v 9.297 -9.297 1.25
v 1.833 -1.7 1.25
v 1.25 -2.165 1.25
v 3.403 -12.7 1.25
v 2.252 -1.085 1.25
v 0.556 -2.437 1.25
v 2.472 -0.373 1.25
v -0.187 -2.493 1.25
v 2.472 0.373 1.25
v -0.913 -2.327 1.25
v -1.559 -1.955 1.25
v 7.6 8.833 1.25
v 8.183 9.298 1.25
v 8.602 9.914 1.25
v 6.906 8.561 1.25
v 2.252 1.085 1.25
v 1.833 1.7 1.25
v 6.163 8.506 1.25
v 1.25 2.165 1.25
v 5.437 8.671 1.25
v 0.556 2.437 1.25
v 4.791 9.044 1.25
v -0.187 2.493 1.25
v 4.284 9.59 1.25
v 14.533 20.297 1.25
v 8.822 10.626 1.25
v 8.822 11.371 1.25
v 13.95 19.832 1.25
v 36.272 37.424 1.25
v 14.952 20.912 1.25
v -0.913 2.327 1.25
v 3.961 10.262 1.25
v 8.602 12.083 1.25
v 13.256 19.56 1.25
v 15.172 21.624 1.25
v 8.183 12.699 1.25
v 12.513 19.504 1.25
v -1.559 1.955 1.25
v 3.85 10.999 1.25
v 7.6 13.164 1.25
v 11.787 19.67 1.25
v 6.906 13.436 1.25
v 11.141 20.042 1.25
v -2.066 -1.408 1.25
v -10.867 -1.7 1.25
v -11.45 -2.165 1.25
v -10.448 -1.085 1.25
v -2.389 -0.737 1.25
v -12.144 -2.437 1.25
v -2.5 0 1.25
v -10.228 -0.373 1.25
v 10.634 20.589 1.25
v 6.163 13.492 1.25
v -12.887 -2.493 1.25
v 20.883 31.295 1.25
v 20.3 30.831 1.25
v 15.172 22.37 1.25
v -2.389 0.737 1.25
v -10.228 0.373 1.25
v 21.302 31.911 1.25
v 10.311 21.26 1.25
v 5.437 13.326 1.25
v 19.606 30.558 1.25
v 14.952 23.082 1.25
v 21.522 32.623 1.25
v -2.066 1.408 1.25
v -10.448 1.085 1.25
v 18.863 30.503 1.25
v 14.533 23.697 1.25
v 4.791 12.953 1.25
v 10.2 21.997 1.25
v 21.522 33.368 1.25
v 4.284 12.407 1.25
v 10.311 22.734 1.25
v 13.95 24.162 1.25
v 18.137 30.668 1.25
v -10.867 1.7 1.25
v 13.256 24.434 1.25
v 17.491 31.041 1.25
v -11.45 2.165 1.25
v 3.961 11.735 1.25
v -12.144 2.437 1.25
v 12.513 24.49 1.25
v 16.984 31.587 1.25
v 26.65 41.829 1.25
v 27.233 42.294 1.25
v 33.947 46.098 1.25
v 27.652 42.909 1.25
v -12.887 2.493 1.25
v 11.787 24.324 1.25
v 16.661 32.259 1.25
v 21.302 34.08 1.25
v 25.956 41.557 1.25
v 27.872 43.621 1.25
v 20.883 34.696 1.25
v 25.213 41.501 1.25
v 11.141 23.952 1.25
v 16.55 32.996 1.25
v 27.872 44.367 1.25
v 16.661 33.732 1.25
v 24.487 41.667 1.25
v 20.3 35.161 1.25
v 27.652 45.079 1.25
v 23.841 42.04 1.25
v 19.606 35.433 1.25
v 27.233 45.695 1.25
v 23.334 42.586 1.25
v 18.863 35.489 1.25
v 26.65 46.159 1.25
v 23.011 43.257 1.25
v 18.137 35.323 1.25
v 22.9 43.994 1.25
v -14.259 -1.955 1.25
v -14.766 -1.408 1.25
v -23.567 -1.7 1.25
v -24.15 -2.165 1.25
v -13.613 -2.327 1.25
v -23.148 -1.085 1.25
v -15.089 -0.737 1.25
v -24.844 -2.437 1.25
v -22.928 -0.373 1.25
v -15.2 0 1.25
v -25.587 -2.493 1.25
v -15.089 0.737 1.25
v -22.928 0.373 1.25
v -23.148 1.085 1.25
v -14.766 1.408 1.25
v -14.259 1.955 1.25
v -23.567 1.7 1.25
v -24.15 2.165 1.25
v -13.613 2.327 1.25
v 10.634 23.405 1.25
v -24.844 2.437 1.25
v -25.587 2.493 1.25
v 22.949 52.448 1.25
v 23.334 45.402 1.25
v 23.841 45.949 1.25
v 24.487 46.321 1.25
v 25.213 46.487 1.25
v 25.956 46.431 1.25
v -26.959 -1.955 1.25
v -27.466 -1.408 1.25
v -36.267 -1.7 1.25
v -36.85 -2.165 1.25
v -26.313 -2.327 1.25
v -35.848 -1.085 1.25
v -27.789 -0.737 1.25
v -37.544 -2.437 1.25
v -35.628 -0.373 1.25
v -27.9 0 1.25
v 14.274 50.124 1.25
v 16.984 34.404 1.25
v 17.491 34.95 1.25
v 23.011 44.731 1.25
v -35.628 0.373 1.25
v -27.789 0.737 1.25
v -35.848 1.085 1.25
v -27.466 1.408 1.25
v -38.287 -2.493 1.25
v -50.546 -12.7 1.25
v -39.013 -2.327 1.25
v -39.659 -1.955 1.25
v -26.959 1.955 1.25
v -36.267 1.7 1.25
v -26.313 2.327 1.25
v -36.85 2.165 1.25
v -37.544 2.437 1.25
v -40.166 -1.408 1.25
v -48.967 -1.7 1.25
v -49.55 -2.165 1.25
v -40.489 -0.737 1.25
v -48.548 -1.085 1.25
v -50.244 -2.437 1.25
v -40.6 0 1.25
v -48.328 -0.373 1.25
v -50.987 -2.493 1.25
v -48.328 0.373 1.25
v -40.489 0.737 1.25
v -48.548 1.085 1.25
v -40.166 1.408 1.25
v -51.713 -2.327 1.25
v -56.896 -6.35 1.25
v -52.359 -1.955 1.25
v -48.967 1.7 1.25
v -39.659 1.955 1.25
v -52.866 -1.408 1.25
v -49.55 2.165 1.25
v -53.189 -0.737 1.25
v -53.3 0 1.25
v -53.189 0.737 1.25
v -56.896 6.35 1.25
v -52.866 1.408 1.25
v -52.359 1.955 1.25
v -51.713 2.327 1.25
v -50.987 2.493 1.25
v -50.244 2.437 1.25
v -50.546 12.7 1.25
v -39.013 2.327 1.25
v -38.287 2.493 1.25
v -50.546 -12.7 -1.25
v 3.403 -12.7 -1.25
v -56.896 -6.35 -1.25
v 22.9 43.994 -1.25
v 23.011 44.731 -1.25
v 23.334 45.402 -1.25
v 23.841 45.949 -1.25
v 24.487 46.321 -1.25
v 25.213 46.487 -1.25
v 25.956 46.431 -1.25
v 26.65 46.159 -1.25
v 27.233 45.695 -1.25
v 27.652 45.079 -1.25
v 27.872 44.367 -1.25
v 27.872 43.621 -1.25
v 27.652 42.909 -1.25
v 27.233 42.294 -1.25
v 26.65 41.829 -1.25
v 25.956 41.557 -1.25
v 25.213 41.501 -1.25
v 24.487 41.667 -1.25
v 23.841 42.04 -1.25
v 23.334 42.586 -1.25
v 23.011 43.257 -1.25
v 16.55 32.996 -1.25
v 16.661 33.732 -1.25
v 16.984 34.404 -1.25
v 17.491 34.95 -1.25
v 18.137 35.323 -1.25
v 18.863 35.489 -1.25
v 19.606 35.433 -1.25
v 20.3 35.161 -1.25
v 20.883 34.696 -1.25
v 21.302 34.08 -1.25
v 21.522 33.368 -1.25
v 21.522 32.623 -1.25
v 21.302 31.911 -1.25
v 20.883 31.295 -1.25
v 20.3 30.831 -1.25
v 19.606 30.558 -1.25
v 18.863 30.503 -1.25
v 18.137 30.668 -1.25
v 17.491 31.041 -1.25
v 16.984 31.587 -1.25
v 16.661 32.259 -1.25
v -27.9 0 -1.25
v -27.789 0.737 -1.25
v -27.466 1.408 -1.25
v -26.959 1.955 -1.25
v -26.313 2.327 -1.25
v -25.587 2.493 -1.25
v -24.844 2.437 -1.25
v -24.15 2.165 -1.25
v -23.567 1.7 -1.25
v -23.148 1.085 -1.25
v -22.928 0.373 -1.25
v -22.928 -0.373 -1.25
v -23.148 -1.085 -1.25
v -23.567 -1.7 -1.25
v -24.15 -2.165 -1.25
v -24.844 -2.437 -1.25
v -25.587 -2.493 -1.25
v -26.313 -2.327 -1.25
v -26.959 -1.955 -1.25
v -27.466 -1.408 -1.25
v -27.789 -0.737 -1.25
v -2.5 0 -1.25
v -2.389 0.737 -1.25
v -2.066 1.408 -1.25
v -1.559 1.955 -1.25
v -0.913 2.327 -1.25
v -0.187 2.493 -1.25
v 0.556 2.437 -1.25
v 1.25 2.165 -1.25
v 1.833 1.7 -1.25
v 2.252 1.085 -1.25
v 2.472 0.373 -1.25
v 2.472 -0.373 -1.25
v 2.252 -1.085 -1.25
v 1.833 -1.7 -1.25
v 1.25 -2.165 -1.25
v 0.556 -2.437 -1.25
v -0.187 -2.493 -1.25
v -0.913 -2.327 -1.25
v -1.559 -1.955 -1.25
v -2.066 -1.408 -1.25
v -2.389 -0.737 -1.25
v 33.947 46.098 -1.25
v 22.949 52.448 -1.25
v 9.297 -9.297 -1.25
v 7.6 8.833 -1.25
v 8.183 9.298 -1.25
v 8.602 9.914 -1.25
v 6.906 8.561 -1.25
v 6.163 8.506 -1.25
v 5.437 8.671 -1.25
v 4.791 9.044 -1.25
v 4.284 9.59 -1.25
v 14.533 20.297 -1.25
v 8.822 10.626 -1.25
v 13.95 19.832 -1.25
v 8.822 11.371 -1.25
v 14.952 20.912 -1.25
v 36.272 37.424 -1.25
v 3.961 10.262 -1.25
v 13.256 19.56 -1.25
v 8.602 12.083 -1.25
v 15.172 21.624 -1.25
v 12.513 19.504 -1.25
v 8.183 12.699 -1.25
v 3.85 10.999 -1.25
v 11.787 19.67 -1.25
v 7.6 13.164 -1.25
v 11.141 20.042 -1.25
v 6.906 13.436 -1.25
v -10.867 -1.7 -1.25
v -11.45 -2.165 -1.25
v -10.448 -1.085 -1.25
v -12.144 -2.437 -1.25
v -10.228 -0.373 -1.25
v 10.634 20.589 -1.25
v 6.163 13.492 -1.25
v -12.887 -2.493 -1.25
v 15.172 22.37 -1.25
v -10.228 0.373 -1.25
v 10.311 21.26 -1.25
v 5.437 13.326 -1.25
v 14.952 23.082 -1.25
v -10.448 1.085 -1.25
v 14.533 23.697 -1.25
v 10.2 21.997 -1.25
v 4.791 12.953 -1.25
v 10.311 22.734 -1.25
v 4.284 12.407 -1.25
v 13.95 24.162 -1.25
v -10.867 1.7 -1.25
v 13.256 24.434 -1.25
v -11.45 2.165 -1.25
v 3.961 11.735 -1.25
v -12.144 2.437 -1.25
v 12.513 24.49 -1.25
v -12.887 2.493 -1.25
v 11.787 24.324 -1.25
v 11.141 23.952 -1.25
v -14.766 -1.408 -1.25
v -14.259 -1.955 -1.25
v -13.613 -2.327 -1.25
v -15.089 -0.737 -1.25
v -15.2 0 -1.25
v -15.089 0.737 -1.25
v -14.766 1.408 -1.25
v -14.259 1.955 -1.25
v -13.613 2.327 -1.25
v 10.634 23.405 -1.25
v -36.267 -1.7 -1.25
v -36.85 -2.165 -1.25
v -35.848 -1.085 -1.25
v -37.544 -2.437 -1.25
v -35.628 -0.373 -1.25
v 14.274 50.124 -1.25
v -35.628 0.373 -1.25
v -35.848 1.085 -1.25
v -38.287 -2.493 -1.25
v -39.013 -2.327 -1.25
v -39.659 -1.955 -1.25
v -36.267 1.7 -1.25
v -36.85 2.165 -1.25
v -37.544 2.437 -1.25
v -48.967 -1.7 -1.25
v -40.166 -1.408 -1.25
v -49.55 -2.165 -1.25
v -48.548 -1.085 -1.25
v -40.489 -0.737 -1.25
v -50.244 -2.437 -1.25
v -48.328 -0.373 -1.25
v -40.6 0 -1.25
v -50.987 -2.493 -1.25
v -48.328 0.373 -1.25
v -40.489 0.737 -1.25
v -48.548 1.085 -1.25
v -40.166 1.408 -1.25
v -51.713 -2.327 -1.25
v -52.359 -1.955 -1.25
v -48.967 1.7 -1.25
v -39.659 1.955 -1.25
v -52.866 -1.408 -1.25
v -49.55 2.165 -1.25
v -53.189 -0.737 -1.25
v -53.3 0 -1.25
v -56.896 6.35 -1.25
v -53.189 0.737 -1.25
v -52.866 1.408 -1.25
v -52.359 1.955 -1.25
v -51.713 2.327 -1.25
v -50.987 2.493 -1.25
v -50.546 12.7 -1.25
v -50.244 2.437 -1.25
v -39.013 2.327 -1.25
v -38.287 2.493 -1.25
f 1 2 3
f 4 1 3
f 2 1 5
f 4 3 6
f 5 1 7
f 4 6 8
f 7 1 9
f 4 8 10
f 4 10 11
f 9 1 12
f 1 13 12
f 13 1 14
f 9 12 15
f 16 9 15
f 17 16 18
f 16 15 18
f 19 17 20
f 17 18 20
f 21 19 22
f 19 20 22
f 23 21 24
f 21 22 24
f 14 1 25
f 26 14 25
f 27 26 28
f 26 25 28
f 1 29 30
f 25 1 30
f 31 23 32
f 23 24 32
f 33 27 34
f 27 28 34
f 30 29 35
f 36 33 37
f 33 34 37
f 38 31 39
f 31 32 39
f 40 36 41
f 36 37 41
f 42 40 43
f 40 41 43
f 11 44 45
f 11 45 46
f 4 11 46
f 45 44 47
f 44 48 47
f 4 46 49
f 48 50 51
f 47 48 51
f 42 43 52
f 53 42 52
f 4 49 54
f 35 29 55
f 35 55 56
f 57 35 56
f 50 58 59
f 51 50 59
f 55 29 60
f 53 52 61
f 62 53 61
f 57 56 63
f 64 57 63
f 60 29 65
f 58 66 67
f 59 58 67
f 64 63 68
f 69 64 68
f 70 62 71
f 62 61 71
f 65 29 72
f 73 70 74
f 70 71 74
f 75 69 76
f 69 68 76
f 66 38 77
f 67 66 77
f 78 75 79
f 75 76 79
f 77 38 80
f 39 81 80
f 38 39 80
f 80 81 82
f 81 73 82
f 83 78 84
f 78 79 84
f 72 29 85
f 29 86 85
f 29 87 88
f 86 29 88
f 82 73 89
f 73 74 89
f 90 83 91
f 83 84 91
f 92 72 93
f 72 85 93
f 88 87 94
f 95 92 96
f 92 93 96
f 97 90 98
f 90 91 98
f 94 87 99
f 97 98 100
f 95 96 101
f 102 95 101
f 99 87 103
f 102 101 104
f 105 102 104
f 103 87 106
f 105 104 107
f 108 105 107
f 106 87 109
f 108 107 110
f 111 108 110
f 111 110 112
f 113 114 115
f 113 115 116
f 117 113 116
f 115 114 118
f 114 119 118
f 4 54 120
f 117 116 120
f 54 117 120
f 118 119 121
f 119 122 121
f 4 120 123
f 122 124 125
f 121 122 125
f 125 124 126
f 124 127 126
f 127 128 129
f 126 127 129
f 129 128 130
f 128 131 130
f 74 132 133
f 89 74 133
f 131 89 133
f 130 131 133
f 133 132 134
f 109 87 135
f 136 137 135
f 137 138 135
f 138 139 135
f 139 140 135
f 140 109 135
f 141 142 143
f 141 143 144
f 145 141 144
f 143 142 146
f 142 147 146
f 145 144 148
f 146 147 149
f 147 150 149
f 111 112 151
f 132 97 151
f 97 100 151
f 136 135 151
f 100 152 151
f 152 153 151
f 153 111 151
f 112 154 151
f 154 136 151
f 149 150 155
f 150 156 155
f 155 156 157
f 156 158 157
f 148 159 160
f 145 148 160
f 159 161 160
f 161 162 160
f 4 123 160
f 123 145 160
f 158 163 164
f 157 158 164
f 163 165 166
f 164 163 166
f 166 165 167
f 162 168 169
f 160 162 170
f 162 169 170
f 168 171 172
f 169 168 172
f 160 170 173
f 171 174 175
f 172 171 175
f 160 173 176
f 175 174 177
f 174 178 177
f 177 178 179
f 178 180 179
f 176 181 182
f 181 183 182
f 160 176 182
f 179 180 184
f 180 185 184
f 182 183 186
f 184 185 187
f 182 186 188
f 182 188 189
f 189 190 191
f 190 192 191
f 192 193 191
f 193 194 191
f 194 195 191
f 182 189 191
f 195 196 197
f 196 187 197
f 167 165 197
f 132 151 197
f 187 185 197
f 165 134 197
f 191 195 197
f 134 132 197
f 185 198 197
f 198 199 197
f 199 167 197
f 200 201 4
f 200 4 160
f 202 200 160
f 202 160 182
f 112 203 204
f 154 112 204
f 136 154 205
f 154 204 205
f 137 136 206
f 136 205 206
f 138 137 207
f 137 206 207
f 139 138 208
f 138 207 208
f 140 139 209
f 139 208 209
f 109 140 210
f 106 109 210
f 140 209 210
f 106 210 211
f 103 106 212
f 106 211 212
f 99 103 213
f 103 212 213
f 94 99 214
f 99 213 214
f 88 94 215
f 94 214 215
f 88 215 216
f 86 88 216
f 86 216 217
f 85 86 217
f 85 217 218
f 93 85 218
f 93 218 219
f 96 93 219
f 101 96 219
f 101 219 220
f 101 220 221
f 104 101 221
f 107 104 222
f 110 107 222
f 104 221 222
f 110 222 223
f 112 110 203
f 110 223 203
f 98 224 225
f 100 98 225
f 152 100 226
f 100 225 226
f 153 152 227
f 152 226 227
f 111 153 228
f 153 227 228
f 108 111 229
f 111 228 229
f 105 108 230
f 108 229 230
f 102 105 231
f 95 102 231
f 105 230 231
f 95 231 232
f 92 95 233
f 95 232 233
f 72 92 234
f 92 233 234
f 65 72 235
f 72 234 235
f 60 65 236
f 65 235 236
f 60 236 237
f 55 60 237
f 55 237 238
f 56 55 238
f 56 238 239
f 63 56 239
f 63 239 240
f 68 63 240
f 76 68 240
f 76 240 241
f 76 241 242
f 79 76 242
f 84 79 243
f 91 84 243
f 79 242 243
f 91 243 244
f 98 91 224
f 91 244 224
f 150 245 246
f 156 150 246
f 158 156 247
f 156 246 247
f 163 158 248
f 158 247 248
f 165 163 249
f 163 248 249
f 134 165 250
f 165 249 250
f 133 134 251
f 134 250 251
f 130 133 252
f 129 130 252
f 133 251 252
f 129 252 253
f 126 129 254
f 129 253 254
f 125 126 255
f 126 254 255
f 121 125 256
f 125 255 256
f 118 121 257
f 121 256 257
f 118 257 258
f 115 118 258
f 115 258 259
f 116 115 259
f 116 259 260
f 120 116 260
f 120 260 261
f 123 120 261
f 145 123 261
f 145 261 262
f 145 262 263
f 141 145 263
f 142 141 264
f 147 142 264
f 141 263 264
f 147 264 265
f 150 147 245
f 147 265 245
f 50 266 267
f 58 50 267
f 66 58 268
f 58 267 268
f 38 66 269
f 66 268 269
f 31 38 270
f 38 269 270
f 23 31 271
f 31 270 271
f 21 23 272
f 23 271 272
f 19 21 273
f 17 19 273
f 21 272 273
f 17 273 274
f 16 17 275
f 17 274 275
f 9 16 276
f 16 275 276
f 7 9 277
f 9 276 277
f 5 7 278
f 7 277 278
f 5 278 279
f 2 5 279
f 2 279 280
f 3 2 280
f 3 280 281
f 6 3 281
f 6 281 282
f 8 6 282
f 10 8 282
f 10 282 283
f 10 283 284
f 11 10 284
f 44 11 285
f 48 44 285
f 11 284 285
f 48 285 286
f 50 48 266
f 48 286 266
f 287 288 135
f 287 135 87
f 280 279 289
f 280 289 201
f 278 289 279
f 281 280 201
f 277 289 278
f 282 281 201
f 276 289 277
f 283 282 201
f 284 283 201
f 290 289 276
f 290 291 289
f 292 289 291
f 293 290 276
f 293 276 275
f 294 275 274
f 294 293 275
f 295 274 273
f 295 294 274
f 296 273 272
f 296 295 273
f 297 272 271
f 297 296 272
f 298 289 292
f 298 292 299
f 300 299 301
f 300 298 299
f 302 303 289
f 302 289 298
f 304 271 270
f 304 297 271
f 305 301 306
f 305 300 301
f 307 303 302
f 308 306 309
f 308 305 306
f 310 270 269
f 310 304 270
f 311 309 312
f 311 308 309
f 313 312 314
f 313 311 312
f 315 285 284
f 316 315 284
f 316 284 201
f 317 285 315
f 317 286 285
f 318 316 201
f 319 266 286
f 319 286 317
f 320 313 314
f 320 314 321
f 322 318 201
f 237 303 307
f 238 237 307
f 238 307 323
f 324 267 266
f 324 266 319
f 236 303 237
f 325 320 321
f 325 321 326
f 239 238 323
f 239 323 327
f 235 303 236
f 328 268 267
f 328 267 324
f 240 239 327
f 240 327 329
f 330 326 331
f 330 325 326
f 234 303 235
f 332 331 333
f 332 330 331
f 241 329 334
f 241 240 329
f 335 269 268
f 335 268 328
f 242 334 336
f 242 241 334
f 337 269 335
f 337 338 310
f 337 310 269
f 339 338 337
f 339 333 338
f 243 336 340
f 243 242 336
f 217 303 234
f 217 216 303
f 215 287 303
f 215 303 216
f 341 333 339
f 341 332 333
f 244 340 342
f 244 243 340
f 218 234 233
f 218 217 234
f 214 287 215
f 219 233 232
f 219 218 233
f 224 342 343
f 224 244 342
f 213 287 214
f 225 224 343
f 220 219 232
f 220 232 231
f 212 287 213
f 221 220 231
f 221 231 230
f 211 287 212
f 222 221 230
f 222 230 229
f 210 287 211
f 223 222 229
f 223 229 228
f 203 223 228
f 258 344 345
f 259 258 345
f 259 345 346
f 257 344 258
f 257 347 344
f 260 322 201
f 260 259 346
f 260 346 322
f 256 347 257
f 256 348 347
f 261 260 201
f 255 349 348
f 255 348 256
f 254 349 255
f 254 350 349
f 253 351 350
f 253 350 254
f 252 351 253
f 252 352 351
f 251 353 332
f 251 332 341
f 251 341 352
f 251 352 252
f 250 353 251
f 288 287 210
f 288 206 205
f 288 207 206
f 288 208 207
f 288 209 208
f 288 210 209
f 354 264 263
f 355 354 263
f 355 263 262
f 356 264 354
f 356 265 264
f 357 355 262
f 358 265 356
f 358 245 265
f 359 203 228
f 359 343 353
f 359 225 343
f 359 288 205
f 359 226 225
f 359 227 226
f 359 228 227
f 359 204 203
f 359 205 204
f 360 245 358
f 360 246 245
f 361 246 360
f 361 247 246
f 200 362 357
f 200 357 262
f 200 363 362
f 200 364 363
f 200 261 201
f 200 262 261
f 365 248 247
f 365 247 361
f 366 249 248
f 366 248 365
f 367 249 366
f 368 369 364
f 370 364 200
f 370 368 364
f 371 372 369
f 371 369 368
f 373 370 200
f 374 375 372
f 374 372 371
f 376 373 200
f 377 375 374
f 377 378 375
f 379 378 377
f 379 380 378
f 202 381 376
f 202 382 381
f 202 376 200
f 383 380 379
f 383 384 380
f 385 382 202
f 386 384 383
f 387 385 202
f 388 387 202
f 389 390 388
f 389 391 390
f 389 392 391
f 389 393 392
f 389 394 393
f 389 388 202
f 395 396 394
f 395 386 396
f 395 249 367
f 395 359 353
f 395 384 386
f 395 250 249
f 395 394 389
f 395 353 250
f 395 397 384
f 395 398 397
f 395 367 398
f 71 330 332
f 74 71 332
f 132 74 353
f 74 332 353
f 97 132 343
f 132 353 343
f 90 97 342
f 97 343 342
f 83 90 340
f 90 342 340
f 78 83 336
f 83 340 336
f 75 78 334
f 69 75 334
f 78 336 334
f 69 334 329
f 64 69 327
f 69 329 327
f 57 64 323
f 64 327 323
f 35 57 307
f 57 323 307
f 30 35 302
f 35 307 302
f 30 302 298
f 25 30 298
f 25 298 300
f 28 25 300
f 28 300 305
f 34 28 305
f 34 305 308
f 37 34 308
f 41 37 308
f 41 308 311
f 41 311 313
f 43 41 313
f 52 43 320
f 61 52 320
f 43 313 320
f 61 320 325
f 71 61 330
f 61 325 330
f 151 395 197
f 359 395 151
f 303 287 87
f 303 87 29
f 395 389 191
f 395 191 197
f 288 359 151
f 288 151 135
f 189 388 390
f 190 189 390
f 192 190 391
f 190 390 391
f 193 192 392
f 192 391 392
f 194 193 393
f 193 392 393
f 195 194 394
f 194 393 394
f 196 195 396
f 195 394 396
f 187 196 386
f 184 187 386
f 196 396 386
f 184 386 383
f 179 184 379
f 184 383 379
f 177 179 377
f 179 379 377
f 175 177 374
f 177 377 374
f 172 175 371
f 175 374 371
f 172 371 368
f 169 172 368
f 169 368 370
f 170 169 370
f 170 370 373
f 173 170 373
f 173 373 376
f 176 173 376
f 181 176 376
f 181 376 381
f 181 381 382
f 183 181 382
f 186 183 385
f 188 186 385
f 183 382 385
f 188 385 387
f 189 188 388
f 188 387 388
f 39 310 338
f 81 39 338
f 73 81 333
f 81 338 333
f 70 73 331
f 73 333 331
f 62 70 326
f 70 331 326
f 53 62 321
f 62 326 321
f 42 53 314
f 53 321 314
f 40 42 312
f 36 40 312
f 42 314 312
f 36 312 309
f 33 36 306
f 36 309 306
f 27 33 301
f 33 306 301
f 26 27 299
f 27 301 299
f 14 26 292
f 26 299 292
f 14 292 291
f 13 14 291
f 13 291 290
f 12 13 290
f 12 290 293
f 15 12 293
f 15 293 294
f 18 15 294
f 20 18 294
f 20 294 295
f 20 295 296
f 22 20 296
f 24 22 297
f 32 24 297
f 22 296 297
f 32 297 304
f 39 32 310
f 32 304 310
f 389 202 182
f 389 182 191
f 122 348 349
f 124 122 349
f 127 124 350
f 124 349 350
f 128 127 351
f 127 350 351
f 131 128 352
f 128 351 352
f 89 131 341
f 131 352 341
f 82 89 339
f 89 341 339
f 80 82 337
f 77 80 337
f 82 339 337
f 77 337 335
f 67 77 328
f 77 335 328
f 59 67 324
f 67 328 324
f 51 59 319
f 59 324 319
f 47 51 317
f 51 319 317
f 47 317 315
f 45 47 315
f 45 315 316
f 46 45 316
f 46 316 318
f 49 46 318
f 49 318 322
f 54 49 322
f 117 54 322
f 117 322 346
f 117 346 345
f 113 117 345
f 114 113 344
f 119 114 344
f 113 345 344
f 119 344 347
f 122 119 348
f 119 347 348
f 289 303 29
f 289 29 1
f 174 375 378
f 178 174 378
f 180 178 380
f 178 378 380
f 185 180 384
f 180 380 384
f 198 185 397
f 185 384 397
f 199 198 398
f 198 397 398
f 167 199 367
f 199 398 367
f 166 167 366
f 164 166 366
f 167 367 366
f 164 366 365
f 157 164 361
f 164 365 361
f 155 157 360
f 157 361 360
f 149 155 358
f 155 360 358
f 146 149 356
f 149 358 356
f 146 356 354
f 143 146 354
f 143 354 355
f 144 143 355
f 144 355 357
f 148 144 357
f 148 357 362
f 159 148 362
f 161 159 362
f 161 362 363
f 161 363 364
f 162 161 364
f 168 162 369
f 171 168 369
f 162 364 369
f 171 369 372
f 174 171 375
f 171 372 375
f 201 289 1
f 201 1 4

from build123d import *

# Parameters (mm, degrees)
SKETCH1_R           = 2.5
BOSS_EXTRUDE1_DEPTH = 2.5


with BuildPart() as part:
    # Sketch1 → Boss-Extrude1 (new body)
    with BuildSketch(Plane(origin=(0, 0, -1.25), x_dir=(-1, 0, 0), z_dir=(0, 0, -1))):
        Polygon((-3.402954744, -12.7), (50.546, -12.7), (56.896, -6.35), (56.896, 6.35), (50.546, 12.7), (-14.274477372, 50.12412006), (-22.948738686, 52.448381374), (-33.947261314, 46.098381374), (-36.271522628, 37.42412006), (-9.297045256, -9.297045256), align=None)
        with Locations((12.7, 0)):
            Circle(SKETCH1_R, mode=Mode.SUBTRACT)
        with Locations((25.4, 0)):
            Circle(SKETCH1_R, mode=Mode.SUBTRACT)
        Circle(SKETCH1_R, mode=Mode.SUBTRACT)
        with Locations((50.8, 0)):
            Circle(SKETCH1_R, mode=Mode.SUBTRACT)
        with Locations((38.1, 0)):
            Circle(SKETCH1_R, mode=Mode.SUBTRACT)
        with Locations((-25.4, 43.994090512)):
            Circle(SKETCH1_R, mode=Mode.SUBTRACT)
        with Locations((-19.05, 32.995567884)):
            Circle(SKETCH1_R, mode=Mode.SUBTRACT)
        with Locations((-12.7, 21.997045256)):
            Circle(SKETCH1_R, mode=Mode.SUBTRACT)
        with Locations((-6.35, 10.998522628)):
            Circle(SKETCH1_R, mode=Mode.SUBTRACT)
    extrude(amount=-BOSS_EXTRUDE1_DEPTH)


solid = part.part
